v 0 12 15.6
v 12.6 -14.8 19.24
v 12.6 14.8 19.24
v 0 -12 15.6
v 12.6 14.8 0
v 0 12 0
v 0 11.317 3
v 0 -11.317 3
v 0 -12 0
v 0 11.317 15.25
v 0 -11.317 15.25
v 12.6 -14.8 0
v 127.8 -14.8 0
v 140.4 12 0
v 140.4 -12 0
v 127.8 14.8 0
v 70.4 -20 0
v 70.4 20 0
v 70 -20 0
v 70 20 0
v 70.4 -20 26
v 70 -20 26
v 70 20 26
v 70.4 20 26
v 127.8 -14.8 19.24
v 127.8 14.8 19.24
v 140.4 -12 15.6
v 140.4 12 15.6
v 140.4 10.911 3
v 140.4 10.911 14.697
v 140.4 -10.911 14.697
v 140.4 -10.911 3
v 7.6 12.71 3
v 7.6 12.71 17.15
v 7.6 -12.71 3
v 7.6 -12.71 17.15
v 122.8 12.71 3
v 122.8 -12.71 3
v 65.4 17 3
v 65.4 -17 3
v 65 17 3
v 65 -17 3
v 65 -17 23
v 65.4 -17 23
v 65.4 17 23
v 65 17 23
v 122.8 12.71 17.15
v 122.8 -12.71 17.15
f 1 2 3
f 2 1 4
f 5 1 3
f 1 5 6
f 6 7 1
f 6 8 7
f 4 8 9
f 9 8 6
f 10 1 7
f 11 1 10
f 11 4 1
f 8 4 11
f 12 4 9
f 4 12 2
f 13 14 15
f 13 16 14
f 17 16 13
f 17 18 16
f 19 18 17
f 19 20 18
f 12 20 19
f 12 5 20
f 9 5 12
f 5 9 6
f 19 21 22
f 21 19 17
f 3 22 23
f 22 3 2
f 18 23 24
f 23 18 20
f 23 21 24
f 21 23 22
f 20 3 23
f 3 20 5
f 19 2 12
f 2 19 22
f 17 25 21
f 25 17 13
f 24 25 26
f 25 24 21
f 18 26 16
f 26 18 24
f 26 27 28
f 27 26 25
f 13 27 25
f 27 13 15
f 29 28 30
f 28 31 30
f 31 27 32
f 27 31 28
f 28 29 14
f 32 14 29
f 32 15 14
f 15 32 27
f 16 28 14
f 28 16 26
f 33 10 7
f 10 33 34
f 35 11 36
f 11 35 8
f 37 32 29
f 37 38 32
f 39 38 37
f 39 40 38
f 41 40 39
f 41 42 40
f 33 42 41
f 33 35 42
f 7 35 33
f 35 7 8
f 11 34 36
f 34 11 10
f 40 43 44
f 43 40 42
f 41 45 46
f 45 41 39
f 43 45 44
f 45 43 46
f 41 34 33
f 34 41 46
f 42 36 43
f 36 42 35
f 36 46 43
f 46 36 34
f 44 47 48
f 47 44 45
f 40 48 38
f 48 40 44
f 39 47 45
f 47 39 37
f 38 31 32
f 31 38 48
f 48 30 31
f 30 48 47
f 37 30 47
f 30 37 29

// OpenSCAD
$fn = 32;

// ----------------------------------------------------------------------
// Faired channel: 140 x 40 x 26 mm, 3 mm walls, faired ends
// ----------------------------------------------------------------------

// --- parameters (mm) ---
length = 140;             // channel length
width = 40;               // channel width at mid length
height = 26;              // channel height at mid length
wall = 3;                 // side wall thickness
floor_t = 3;              // floor thickness
end_w = 24;               // faired end width
end_h = 15.6;             // faired end height

difference() {
  union() {
    hull() {
      translate([0, -12, 0]) cube([0.4, 24, 15.6]);
      translate([12.6, -14.8, 0]) cube([0.4, 29.6, 19.24]);
    }
    hull() {
      translate([12.6, -14.8, 0]) cube([0.4, 29.6, 19.24]);
      translate([70, -20, 0]) cube([0.4, 40, 26]);
    }
    hull() {
      translate([70, -20, 0]) cube([0.4, 40, 26]);
      translate([127.4, -14.8, 0]) cube([0.4, 29.6, 19.24]);
    }
    hull() {
      translate([127.4, -14.8, 0]) cube([0.4, 29.6, 19.24]);
      translate([140, -12, 0]) cube([0.4, 24, 15.6]);
    }
  }
  /* cavity, 5 mm proud of both ends so the ports are cut clean */
  hull() {
    translate([-5, -10.4, 3]) cube([0.4, 20.8, 11]);
    translate([7.6, -12.71, 3]) cube([0.4, 25.42, 14.15]);
  }
  hull() {
    translate([7.6, -12.71, 3]) cube([0.4, 25.42, 14.15]);
    translate([65, -17, 3]) cube([0.4, 34, 20]);
  }
  hull() {
    translate([65, -17, 3]) cube([0.4, 34, 20]);
    translate([122.4, -12.71, 3]) cube([0.4, 25.42, 14.15]);
  }
  hull() {
    translate([122.4, -12.71, 3]) cube([0.4, 25.42, 14.15]);
    translate([145, -10.4, 3]) cube([0.4, 20.8, 11]);
  }
}
